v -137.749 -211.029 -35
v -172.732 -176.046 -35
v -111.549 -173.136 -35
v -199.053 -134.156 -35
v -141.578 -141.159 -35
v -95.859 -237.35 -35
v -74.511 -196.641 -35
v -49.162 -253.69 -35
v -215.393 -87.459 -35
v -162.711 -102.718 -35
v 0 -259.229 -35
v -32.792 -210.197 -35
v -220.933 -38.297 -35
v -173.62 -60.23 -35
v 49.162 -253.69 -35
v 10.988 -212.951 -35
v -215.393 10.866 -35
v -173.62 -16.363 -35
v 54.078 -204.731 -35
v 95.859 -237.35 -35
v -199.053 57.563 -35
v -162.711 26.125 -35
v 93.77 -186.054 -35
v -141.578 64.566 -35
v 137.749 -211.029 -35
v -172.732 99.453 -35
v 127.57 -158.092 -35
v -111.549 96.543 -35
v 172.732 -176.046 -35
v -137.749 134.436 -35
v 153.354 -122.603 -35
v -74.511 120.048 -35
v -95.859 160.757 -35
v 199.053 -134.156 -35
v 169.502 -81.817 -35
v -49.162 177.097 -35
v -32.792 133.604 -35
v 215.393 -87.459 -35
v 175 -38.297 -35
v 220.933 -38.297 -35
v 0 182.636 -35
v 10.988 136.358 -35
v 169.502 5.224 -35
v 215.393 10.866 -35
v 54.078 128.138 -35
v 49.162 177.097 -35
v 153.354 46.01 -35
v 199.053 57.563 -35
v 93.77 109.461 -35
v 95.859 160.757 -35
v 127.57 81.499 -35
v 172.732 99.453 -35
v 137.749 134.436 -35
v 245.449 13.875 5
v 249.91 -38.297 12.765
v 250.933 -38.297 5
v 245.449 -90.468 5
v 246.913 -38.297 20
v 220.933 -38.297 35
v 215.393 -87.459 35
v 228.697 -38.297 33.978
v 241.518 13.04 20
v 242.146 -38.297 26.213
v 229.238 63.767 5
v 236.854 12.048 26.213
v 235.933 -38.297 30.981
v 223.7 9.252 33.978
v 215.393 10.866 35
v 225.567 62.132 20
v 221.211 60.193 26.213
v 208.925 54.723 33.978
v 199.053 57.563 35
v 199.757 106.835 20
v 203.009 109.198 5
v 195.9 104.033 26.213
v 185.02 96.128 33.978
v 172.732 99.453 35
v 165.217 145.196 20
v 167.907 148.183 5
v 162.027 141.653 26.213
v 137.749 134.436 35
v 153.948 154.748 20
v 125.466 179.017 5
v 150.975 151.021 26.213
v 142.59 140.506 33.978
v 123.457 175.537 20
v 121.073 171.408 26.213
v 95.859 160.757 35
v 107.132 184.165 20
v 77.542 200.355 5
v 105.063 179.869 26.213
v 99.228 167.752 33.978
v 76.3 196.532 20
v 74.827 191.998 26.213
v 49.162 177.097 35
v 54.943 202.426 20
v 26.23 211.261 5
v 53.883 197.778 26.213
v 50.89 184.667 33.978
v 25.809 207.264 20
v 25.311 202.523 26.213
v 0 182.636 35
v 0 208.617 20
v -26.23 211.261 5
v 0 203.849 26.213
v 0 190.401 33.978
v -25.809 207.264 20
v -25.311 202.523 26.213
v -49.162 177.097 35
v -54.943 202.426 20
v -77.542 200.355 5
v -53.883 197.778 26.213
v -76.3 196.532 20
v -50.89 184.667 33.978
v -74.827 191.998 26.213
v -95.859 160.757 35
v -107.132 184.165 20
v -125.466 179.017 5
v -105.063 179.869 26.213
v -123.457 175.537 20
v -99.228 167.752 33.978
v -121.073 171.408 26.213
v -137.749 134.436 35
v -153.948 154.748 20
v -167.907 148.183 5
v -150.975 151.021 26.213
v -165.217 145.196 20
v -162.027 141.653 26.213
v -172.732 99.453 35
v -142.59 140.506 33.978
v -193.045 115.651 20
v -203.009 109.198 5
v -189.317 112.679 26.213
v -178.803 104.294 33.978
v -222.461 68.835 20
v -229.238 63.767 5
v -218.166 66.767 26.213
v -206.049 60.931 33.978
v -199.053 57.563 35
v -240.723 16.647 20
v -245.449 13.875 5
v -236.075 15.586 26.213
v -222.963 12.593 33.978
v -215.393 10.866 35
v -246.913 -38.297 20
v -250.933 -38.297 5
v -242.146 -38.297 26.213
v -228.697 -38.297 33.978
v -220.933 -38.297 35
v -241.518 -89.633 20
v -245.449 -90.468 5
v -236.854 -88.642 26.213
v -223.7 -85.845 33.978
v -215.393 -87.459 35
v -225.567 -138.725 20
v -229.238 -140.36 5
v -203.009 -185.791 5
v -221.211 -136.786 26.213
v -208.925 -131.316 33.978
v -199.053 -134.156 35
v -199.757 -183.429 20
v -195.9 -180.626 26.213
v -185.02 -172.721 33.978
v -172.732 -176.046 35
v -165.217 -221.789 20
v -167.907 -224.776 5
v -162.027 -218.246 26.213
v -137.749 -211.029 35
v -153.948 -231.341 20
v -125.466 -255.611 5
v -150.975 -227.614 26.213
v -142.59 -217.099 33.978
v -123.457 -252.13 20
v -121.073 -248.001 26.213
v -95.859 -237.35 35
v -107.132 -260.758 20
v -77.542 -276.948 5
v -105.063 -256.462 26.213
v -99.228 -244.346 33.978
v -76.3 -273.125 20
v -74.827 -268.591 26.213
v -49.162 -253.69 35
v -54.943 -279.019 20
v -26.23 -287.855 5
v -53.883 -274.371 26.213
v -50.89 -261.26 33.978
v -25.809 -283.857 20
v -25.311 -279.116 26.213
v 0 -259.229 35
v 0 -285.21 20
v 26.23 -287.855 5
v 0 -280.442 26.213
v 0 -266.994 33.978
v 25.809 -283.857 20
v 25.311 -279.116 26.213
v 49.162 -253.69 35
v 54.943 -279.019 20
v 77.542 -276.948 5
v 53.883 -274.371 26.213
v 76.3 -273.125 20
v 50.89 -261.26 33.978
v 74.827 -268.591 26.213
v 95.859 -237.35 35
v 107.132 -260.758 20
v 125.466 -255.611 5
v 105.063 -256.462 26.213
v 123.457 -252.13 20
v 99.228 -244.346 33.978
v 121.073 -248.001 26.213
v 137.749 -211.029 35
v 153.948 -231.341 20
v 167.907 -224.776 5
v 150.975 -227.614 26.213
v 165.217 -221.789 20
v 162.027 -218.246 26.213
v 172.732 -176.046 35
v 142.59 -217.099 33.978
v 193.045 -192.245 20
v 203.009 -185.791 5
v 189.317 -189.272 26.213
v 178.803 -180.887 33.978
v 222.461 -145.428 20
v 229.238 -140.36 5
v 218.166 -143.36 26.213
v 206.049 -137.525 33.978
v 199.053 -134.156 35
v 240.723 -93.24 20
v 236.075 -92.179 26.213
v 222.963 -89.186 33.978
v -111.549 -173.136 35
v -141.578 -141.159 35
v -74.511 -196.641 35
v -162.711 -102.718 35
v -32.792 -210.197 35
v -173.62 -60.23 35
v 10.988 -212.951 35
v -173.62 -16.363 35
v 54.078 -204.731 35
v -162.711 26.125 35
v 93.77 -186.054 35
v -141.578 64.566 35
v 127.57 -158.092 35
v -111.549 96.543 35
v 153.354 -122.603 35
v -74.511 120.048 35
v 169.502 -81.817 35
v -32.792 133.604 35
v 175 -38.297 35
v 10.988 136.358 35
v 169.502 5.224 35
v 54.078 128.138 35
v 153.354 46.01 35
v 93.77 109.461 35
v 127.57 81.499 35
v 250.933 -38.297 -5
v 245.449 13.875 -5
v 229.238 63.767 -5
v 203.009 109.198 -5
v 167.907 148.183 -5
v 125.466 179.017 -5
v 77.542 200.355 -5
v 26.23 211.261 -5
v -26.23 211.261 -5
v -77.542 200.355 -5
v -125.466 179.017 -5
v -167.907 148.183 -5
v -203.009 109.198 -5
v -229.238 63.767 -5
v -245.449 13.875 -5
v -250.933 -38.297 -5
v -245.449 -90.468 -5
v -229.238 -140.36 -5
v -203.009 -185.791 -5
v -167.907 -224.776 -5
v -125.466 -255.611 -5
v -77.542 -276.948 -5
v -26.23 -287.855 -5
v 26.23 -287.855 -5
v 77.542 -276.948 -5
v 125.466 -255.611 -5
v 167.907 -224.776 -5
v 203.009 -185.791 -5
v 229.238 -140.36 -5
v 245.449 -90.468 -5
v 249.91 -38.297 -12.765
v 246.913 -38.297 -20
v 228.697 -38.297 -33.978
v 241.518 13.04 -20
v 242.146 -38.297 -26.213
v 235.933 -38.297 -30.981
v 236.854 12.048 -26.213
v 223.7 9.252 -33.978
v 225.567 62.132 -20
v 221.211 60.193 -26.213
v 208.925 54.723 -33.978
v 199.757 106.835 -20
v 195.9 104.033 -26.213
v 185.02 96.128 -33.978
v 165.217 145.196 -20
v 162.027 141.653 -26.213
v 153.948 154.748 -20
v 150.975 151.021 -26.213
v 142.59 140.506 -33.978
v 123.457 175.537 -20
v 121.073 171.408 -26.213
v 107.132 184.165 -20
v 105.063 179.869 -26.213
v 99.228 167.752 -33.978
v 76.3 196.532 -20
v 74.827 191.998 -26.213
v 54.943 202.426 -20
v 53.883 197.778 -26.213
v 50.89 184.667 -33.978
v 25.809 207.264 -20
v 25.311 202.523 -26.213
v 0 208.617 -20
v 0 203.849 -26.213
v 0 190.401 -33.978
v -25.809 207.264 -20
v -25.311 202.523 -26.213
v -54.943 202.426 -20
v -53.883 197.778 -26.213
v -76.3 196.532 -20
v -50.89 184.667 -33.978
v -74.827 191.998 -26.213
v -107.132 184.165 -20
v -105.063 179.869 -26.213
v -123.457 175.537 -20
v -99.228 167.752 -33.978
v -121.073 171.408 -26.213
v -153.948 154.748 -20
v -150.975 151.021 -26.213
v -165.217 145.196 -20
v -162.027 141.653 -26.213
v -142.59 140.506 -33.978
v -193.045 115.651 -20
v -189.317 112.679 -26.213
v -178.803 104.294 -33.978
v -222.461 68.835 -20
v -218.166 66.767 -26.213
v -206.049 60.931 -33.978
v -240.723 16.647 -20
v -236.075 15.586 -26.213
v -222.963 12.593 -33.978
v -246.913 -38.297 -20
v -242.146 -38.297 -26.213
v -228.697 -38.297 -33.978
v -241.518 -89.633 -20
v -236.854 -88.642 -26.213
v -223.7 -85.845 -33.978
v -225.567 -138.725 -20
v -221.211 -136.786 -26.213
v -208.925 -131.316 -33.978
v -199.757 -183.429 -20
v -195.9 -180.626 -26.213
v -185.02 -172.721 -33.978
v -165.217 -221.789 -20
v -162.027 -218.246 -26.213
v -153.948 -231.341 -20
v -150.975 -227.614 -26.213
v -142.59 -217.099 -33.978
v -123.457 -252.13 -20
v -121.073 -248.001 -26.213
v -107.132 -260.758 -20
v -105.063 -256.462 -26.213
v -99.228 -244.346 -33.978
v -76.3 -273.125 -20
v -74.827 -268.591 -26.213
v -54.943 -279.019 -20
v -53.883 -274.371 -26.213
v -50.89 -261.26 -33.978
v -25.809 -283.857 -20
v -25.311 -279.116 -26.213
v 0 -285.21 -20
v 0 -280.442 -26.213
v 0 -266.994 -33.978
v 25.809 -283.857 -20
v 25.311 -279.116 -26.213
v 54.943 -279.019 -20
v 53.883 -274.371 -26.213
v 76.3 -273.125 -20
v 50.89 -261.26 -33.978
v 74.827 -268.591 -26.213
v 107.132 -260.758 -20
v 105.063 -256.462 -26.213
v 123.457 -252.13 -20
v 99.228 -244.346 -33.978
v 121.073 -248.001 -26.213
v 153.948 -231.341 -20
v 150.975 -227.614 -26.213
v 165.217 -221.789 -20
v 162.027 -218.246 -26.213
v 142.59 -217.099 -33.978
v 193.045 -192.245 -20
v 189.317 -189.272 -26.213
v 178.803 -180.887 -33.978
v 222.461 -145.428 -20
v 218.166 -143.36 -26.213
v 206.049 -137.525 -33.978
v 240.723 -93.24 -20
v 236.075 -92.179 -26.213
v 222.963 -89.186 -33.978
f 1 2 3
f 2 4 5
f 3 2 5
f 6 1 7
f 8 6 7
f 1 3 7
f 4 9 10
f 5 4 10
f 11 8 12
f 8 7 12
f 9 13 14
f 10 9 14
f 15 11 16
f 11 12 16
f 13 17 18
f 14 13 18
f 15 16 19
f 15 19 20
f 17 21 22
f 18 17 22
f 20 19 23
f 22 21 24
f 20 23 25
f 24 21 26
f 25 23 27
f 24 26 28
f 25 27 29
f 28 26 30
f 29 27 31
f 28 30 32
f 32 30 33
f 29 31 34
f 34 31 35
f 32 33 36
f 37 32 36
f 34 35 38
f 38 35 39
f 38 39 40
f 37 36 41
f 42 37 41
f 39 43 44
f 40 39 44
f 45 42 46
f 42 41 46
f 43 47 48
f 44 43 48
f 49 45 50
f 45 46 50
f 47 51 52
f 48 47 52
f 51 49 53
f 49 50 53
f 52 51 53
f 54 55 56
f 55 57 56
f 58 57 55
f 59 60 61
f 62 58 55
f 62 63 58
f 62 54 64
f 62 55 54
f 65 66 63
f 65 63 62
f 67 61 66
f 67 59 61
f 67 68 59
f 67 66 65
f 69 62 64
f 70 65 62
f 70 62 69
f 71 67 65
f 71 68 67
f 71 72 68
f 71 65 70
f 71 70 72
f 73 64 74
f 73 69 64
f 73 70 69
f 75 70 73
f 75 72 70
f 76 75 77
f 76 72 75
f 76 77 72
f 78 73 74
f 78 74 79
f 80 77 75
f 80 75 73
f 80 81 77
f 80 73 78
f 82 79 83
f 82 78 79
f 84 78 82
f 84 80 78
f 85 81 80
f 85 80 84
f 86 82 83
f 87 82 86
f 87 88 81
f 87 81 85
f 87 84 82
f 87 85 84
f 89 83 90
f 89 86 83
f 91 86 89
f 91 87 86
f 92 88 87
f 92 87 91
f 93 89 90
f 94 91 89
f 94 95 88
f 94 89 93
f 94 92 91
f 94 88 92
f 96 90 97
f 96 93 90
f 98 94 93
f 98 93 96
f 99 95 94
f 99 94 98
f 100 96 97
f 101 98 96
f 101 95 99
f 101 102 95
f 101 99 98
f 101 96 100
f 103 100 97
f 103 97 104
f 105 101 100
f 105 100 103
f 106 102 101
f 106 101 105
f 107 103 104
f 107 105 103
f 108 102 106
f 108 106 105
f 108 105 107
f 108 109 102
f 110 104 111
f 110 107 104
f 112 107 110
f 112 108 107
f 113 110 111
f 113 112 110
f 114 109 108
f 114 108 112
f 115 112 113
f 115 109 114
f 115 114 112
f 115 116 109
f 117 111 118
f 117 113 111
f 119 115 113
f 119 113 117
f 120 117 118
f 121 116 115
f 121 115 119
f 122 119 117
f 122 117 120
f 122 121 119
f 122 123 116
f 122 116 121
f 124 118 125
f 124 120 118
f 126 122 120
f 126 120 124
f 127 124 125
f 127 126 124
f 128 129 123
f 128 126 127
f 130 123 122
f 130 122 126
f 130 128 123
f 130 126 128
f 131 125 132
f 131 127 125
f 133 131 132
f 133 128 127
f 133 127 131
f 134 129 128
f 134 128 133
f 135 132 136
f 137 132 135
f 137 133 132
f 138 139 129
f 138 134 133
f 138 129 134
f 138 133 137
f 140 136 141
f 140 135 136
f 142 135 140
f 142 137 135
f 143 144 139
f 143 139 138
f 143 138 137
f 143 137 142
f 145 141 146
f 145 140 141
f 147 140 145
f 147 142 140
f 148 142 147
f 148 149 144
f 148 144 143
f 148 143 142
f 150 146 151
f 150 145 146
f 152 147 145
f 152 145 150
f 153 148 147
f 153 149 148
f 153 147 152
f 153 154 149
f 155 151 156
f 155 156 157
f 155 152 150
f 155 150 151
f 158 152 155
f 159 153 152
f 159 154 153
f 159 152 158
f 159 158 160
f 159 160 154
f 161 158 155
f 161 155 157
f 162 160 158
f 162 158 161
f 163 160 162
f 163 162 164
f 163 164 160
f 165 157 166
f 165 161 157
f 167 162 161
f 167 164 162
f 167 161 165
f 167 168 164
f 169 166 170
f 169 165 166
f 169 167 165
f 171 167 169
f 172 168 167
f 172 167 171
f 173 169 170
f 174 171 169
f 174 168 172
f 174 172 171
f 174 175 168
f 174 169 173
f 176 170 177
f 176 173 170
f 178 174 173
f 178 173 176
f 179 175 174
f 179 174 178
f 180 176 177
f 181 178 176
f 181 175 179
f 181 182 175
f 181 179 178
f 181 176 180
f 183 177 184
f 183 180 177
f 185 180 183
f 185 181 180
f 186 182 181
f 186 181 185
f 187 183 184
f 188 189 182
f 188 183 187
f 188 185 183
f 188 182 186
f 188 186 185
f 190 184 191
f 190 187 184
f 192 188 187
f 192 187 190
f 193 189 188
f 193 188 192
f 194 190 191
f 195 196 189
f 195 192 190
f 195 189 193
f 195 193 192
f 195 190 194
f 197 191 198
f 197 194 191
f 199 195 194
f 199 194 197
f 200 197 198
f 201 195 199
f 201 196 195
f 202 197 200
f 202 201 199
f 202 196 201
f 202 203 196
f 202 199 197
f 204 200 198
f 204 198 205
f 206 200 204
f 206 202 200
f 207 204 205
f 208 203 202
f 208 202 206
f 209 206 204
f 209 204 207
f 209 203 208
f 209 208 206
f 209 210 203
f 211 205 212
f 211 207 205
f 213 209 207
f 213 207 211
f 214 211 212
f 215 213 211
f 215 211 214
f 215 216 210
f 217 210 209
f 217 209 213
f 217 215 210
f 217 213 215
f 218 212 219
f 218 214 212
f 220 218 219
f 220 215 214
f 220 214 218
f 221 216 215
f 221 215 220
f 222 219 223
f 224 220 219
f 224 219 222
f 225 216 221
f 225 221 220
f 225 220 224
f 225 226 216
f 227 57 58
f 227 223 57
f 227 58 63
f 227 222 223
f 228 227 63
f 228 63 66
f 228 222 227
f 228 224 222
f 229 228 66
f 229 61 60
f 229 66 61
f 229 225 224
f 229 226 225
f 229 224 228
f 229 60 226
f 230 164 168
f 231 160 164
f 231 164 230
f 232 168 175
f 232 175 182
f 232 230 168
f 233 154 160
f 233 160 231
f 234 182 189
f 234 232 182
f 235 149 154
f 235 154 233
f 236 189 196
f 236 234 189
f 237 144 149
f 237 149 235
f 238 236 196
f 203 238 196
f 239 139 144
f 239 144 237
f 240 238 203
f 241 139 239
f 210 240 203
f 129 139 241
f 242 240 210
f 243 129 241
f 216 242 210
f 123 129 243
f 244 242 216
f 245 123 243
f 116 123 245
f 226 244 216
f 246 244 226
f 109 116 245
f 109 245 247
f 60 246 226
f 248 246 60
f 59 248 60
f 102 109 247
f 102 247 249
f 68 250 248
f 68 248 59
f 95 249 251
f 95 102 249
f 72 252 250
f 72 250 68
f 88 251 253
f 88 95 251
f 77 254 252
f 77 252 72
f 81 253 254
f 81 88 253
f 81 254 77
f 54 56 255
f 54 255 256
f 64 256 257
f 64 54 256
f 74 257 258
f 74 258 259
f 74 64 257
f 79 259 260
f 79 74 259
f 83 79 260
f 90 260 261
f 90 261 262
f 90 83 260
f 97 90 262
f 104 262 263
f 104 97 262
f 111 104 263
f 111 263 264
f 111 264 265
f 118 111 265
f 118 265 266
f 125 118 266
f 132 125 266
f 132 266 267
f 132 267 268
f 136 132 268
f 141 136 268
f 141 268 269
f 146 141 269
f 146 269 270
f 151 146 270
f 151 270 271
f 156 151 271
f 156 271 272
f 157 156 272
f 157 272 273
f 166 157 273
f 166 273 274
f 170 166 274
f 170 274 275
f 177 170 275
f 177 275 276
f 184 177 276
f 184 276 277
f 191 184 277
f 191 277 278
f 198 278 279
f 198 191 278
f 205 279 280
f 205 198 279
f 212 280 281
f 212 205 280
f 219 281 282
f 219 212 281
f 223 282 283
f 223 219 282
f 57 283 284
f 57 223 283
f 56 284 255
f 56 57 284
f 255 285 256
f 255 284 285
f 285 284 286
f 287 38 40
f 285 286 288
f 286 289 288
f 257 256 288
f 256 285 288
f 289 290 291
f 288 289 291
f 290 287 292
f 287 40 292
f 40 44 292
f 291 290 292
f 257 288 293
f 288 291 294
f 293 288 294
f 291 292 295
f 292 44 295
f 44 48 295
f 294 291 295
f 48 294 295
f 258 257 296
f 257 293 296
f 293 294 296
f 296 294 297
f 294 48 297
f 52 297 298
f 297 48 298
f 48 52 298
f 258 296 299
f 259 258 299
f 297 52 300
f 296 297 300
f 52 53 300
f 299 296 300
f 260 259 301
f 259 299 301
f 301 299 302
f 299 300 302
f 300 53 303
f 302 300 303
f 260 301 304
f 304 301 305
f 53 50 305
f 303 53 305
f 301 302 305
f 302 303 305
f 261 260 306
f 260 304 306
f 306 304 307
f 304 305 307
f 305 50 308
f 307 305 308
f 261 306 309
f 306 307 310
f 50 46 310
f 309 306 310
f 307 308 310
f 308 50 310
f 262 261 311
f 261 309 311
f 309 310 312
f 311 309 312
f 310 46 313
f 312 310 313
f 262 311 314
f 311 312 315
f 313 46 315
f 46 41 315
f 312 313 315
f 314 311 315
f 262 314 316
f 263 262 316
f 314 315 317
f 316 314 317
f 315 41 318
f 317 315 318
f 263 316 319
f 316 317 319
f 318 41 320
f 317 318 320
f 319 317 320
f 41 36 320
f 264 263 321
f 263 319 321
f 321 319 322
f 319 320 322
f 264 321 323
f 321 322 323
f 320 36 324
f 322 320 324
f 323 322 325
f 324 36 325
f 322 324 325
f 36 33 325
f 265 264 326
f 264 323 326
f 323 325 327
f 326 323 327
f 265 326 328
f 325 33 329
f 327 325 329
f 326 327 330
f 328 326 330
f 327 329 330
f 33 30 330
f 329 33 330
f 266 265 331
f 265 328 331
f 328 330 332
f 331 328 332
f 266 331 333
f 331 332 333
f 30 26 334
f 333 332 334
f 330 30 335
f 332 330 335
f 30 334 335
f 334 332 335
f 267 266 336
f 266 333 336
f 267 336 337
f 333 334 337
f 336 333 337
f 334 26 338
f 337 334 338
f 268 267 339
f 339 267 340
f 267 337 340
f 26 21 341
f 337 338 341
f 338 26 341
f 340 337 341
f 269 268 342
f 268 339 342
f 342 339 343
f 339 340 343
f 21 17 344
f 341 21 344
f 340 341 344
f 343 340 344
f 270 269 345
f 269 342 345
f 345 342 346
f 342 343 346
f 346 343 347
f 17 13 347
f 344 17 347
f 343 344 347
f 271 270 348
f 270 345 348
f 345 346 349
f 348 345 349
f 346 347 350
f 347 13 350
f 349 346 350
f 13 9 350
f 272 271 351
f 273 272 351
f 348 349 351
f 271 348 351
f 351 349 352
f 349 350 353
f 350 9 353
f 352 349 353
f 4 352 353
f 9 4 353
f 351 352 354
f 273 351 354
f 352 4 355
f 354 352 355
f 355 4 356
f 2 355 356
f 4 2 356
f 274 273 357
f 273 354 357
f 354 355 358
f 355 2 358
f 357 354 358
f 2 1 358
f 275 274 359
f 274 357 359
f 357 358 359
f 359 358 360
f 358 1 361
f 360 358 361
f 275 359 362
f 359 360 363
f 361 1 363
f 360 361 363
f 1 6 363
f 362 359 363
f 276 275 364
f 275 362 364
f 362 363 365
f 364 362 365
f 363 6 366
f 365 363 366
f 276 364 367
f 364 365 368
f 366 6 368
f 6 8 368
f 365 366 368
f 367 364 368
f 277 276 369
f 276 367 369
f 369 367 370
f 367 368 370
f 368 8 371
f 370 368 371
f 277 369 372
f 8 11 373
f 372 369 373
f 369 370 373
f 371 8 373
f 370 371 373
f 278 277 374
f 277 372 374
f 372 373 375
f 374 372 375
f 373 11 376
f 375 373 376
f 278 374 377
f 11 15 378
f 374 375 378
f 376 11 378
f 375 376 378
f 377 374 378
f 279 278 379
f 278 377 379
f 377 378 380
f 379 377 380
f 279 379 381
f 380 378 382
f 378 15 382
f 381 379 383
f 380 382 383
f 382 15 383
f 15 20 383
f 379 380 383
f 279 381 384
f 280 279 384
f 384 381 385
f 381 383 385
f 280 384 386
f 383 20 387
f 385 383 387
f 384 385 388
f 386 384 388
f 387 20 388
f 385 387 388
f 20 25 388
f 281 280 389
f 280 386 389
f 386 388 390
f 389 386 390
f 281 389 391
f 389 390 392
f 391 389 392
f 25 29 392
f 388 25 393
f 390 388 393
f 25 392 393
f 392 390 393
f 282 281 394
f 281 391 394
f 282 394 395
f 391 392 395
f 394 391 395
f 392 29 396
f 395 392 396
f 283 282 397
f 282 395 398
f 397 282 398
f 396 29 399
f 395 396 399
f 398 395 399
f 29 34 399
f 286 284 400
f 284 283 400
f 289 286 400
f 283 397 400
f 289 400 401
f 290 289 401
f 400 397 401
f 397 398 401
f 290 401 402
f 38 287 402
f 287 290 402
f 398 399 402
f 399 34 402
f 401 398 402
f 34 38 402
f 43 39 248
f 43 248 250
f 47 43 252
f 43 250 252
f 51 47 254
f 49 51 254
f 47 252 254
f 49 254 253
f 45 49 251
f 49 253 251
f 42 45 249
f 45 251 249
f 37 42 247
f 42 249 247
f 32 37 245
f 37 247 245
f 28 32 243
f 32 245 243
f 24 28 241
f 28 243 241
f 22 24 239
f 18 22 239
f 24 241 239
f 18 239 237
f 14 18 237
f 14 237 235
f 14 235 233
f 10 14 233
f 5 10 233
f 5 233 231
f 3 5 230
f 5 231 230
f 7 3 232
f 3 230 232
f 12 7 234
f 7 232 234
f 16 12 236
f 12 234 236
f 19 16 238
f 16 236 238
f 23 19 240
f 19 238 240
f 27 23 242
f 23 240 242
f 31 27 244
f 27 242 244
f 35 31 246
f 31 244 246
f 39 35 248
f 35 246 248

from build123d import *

# Parameters (mm, degrees)
SKETCH1_R           = 250.932647595
BOSS_EXTRUDE1_DEPTH = 35
FILLET1_R           = 30
SKETCH2_R           = 175
CUT_EXTRUDE1_DEPTH  = 70


with BuildPart() as part:
    # Sketch1 → Boss-Extrude1 (new, symmetric)
    with BuildSketch(Plane.XY):
        with Locations((0, -38.296576895)):
            Circle(SKETCH1_R)
    extrude(amount=BOSS_EXTRUDE1_DEPTH, both=True)

    # Fillet1
    fillet1_edges = [part.edges().sort_by_distance(p)[0] for p in [
        (-250.932647595, -38.296576895, -35),
        (-250.932647595, -38.296576895, 35),
    ]]
    fillet(fillet1_edges, radius=FILLET1_R)

    # Sketch2 → Cut-Extrude1 (cut)
    with BuildSketch(Plane.XY.offset(35)):
        with Locations((0, -38.296576895)):
            Circle(SKETCH2_R)
    extrude(amount=-CUT_EXTRUDE1_DEPTH, mode=Mode.SUBTRACT)


solid = part.part
